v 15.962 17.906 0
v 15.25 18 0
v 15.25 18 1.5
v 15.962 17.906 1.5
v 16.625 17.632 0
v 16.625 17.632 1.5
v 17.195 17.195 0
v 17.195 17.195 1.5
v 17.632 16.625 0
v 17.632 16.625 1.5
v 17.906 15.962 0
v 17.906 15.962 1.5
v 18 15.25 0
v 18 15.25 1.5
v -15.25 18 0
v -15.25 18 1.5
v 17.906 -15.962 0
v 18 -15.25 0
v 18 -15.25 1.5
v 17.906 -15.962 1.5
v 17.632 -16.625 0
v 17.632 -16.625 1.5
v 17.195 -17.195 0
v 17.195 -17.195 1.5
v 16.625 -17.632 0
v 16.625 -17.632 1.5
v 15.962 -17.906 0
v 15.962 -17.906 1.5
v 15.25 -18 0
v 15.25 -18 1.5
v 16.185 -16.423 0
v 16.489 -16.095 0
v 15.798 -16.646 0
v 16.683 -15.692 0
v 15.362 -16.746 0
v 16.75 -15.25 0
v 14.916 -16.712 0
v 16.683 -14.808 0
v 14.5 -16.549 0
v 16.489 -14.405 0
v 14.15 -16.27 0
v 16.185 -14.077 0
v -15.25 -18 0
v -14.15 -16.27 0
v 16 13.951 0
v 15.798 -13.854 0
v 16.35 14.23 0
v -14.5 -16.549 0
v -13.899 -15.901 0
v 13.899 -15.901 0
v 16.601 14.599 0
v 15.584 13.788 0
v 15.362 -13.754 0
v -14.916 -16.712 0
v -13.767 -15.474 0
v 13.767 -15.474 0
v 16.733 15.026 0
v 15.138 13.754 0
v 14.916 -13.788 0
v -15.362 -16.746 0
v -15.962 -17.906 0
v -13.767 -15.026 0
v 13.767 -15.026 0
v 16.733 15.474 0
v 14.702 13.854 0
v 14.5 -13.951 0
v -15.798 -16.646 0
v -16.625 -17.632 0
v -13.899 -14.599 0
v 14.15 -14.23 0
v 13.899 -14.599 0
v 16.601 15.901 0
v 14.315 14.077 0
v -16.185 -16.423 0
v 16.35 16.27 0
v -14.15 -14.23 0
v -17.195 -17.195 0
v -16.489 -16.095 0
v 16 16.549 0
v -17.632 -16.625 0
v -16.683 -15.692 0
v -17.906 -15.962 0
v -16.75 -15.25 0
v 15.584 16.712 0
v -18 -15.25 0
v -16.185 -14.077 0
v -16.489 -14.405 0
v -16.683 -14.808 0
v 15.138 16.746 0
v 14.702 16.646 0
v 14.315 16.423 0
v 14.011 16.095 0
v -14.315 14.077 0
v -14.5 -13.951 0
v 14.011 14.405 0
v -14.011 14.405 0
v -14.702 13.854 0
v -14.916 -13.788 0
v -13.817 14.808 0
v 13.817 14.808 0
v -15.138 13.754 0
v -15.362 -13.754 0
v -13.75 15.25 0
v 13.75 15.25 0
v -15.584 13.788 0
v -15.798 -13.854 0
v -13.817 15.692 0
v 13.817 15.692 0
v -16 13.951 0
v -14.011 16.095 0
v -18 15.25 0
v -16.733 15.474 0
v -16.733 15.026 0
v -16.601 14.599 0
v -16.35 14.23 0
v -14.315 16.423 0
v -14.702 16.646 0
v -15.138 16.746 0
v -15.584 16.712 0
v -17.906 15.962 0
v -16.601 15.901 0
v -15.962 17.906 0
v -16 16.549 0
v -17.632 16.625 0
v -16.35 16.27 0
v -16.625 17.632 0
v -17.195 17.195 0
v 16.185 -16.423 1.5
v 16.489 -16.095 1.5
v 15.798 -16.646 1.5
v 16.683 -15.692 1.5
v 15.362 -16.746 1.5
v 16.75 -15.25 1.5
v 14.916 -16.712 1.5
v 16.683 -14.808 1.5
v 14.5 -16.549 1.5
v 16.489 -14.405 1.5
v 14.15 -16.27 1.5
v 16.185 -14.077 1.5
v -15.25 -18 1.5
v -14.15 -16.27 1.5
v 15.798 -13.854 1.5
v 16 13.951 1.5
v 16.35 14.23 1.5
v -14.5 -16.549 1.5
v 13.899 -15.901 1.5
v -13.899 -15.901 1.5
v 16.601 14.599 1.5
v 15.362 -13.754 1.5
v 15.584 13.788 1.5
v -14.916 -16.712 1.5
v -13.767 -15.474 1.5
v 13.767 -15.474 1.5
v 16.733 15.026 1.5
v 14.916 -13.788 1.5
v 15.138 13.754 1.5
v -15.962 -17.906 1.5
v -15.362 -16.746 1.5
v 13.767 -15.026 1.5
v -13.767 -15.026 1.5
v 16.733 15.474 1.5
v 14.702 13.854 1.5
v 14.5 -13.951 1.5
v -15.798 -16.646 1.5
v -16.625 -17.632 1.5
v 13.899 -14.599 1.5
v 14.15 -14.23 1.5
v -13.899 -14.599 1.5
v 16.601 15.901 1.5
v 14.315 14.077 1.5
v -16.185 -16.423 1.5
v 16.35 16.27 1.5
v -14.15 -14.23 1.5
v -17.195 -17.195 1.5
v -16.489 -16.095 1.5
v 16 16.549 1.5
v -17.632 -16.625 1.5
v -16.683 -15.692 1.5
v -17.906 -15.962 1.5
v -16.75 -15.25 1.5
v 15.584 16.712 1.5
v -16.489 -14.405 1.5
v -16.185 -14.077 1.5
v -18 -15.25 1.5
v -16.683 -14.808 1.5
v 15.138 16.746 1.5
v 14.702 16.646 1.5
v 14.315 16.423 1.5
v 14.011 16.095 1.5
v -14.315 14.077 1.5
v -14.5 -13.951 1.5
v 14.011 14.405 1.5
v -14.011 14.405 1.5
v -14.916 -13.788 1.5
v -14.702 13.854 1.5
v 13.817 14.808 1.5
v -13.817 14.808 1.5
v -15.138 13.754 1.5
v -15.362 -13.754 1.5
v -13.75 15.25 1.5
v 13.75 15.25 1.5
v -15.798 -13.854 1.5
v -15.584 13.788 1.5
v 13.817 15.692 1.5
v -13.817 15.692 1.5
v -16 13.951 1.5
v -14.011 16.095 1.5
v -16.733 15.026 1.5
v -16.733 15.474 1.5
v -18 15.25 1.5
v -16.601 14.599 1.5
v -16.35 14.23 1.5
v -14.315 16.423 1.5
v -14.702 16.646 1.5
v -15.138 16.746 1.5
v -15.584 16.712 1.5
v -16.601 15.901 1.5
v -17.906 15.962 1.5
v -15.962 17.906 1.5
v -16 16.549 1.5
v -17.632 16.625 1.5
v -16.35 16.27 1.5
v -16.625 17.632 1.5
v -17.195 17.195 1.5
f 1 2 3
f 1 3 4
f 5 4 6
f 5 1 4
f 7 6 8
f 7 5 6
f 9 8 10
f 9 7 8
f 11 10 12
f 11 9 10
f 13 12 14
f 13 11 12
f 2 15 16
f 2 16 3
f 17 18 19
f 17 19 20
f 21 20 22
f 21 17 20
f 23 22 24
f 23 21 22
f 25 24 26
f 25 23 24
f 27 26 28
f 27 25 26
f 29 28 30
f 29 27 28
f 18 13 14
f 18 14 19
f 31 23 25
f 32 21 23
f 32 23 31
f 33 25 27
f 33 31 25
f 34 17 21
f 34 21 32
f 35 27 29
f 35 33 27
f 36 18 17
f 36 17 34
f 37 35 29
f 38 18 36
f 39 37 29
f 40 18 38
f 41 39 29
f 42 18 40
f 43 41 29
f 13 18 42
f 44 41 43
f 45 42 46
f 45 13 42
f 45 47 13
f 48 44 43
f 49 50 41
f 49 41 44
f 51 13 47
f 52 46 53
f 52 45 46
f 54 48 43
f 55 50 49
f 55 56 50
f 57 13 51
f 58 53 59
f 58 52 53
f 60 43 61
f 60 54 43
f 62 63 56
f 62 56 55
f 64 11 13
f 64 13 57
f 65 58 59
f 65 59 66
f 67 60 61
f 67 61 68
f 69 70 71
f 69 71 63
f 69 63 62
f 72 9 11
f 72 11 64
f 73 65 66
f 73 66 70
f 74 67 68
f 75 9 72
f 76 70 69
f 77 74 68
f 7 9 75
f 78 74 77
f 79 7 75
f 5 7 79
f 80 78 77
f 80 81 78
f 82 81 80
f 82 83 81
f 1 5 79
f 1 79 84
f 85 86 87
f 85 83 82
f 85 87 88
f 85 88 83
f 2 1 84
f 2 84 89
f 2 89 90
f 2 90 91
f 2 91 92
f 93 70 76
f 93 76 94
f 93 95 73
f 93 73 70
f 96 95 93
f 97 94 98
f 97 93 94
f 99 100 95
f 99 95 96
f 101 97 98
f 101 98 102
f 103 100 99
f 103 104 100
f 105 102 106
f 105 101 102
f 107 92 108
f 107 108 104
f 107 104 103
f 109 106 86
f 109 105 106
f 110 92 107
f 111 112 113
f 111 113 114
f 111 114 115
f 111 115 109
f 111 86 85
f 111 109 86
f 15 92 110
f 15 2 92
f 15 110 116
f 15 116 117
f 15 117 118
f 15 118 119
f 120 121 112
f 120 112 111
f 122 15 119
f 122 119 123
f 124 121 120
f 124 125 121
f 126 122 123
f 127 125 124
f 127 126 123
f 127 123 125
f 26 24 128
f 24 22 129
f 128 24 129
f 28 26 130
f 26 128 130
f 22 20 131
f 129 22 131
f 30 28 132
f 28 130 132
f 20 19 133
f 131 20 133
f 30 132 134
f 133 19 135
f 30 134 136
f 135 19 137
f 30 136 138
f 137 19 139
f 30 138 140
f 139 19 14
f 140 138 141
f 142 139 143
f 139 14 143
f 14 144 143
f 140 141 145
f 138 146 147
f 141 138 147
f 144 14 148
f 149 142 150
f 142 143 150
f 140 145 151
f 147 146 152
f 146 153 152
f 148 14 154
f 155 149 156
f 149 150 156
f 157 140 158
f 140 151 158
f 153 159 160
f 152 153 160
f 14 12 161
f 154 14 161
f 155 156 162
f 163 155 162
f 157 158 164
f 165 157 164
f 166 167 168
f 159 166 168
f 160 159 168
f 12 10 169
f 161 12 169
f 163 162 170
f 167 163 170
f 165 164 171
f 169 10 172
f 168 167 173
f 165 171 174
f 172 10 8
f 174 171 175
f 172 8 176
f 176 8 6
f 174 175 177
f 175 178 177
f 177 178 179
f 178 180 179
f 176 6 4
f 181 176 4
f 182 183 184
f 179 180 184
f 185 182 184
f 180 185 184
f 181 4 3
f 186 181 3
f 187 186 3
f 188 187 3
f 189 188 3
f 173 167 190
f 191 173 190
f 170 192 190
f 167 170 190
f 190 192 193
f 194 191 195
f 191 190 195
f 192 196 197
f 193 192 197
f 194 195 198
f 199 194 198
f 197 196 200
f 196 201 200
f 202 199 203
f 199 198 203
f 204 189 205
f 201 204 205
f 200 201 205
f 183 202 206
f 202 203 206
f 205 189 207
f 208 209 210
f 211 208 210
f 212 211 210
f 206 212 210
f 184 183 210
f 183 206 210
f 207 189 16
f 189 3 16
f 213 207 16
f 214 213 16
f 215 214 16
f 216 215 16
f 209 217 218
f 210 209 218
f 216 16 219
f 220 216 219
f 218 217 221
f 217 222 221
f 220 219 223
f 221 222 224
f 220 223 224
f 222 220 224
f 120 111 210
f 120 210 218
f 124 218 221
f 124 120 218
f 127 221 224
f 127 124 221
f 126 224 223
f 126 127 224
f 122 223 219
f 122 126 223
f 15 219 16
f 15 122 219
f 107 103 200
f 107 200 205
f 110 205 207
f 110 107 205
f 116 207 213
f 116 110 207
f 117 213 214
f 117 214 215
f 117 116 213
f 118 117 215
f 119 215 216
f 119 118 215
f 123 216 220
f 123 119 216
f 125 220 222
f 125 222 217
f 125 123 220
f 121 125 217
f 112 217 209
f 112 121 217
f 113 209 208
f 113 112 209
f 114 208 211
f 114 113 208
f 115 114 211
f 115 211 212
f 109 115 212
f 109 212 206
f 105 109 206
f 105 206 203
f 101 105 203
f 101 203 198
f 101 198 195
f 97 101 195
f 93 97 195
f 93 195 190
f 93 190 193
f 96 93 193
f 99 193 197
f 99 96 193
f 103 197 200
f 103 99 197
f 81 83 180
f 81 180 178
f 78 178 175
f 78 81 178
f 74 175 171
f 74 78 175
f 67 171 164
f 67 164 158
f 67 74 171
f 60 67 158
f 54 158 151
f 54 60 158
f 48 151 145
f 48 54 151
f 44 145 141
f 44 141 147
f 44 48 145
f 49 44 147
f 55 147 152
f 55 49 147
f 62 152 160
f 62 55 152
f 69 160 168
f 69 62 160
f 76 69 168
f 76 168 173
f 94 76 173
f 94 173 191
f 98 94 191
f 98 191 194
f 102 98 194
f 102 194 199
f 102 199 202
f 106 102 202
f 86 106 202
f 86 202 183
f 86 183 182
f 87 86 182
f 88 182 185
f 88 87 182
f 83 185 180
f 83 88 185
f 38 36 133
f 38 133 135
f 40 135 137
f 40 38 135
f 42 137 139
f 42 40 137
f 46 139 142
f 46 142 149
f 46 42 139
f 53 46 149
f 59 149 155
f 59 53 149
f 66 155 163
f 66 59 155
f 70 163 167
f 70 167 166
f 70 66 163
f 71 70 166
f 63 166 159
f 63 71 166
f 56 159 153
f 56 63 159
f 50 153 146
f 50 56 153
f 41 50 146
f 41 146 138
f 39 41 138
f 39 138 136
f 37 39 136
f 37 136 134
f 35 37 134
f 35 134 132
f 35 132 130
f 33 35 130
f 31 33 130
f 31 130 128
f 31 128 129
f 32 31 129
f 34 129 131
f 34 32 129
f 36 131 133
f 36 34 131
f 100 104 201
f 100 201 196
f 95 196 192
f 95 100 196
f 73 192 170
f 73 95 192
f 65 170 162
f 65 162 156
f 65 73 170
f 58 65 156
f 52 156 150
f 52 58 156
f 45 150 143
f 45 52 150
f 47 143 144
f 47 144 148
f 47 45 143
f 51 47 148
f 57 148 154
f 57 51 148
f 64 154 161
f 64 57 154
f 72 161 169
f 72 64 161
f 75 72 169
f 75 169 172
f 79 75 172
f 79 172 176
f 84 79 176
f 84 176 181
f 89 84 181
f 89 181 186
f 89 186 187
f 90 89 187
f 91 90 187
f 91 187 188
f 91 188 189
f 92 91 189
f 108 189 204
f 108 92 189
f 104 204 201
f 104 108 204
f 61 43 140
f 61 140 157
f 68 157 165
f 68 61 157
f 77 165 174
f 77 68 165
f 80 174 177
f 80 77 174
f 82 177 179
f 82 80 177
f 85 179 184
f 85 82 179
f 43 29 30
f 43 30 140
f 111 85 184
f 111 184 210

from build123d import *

# Parameters (mm, degrees)
SKETCH_1_R      = 1.5
EXTRUDE_1_DEPTH = 1.5


with BuildPart() as part:
    # 草图1 → 凸台-拉伸1 (new body)
    with BuildSketch(Plane.XY):
        with BuildLine():
            Line((-15.25, 18), (15.25, 18))
            ThreePointArc((15.25, 18), (17.194543648, 17.194543648), (18, 15.25))
            Line((18, 15.25), (18, -15.25))
            ThreePointArc((18, -15.25), (17.194543648, -17.194543648), (15.25, -18))
            Line((15.25, -18), (-15.25, -18))
            ThreePointArc((-15.25, -18), (-17.194543648, -17.194543648), (-18, -15.25))
            Line((-18, -15.25), (-18, 15.25))
            ThreePointArc((-18, 15.25), (-17.194543648, 17.194543648), (-15.25, 18))
        make_face()
        with Locations((-15.25, 15.25)):
            Circle(SKETCH_1_R, mode=Mode.SUBTRACT)
        with Locations(Location((15.25, 15.25, 0), (0, 0, 180))):
            Circle(SKETCH_1_R, mode=Mode.SUBTRACT)
        with Locations((15.25, -15.25)):
            Circle(SKETCH_1_R, mode=Mode.SUBTRACT)
        with Locations(Location((-15.25, -15.25, 0), (0, 0, 180))):
            Circle(SKETCH_1_R, mode=Mode.SUBTRACT)
    extrude(amount=EXTRUDE_1_DEPTH)


solid = part.part
